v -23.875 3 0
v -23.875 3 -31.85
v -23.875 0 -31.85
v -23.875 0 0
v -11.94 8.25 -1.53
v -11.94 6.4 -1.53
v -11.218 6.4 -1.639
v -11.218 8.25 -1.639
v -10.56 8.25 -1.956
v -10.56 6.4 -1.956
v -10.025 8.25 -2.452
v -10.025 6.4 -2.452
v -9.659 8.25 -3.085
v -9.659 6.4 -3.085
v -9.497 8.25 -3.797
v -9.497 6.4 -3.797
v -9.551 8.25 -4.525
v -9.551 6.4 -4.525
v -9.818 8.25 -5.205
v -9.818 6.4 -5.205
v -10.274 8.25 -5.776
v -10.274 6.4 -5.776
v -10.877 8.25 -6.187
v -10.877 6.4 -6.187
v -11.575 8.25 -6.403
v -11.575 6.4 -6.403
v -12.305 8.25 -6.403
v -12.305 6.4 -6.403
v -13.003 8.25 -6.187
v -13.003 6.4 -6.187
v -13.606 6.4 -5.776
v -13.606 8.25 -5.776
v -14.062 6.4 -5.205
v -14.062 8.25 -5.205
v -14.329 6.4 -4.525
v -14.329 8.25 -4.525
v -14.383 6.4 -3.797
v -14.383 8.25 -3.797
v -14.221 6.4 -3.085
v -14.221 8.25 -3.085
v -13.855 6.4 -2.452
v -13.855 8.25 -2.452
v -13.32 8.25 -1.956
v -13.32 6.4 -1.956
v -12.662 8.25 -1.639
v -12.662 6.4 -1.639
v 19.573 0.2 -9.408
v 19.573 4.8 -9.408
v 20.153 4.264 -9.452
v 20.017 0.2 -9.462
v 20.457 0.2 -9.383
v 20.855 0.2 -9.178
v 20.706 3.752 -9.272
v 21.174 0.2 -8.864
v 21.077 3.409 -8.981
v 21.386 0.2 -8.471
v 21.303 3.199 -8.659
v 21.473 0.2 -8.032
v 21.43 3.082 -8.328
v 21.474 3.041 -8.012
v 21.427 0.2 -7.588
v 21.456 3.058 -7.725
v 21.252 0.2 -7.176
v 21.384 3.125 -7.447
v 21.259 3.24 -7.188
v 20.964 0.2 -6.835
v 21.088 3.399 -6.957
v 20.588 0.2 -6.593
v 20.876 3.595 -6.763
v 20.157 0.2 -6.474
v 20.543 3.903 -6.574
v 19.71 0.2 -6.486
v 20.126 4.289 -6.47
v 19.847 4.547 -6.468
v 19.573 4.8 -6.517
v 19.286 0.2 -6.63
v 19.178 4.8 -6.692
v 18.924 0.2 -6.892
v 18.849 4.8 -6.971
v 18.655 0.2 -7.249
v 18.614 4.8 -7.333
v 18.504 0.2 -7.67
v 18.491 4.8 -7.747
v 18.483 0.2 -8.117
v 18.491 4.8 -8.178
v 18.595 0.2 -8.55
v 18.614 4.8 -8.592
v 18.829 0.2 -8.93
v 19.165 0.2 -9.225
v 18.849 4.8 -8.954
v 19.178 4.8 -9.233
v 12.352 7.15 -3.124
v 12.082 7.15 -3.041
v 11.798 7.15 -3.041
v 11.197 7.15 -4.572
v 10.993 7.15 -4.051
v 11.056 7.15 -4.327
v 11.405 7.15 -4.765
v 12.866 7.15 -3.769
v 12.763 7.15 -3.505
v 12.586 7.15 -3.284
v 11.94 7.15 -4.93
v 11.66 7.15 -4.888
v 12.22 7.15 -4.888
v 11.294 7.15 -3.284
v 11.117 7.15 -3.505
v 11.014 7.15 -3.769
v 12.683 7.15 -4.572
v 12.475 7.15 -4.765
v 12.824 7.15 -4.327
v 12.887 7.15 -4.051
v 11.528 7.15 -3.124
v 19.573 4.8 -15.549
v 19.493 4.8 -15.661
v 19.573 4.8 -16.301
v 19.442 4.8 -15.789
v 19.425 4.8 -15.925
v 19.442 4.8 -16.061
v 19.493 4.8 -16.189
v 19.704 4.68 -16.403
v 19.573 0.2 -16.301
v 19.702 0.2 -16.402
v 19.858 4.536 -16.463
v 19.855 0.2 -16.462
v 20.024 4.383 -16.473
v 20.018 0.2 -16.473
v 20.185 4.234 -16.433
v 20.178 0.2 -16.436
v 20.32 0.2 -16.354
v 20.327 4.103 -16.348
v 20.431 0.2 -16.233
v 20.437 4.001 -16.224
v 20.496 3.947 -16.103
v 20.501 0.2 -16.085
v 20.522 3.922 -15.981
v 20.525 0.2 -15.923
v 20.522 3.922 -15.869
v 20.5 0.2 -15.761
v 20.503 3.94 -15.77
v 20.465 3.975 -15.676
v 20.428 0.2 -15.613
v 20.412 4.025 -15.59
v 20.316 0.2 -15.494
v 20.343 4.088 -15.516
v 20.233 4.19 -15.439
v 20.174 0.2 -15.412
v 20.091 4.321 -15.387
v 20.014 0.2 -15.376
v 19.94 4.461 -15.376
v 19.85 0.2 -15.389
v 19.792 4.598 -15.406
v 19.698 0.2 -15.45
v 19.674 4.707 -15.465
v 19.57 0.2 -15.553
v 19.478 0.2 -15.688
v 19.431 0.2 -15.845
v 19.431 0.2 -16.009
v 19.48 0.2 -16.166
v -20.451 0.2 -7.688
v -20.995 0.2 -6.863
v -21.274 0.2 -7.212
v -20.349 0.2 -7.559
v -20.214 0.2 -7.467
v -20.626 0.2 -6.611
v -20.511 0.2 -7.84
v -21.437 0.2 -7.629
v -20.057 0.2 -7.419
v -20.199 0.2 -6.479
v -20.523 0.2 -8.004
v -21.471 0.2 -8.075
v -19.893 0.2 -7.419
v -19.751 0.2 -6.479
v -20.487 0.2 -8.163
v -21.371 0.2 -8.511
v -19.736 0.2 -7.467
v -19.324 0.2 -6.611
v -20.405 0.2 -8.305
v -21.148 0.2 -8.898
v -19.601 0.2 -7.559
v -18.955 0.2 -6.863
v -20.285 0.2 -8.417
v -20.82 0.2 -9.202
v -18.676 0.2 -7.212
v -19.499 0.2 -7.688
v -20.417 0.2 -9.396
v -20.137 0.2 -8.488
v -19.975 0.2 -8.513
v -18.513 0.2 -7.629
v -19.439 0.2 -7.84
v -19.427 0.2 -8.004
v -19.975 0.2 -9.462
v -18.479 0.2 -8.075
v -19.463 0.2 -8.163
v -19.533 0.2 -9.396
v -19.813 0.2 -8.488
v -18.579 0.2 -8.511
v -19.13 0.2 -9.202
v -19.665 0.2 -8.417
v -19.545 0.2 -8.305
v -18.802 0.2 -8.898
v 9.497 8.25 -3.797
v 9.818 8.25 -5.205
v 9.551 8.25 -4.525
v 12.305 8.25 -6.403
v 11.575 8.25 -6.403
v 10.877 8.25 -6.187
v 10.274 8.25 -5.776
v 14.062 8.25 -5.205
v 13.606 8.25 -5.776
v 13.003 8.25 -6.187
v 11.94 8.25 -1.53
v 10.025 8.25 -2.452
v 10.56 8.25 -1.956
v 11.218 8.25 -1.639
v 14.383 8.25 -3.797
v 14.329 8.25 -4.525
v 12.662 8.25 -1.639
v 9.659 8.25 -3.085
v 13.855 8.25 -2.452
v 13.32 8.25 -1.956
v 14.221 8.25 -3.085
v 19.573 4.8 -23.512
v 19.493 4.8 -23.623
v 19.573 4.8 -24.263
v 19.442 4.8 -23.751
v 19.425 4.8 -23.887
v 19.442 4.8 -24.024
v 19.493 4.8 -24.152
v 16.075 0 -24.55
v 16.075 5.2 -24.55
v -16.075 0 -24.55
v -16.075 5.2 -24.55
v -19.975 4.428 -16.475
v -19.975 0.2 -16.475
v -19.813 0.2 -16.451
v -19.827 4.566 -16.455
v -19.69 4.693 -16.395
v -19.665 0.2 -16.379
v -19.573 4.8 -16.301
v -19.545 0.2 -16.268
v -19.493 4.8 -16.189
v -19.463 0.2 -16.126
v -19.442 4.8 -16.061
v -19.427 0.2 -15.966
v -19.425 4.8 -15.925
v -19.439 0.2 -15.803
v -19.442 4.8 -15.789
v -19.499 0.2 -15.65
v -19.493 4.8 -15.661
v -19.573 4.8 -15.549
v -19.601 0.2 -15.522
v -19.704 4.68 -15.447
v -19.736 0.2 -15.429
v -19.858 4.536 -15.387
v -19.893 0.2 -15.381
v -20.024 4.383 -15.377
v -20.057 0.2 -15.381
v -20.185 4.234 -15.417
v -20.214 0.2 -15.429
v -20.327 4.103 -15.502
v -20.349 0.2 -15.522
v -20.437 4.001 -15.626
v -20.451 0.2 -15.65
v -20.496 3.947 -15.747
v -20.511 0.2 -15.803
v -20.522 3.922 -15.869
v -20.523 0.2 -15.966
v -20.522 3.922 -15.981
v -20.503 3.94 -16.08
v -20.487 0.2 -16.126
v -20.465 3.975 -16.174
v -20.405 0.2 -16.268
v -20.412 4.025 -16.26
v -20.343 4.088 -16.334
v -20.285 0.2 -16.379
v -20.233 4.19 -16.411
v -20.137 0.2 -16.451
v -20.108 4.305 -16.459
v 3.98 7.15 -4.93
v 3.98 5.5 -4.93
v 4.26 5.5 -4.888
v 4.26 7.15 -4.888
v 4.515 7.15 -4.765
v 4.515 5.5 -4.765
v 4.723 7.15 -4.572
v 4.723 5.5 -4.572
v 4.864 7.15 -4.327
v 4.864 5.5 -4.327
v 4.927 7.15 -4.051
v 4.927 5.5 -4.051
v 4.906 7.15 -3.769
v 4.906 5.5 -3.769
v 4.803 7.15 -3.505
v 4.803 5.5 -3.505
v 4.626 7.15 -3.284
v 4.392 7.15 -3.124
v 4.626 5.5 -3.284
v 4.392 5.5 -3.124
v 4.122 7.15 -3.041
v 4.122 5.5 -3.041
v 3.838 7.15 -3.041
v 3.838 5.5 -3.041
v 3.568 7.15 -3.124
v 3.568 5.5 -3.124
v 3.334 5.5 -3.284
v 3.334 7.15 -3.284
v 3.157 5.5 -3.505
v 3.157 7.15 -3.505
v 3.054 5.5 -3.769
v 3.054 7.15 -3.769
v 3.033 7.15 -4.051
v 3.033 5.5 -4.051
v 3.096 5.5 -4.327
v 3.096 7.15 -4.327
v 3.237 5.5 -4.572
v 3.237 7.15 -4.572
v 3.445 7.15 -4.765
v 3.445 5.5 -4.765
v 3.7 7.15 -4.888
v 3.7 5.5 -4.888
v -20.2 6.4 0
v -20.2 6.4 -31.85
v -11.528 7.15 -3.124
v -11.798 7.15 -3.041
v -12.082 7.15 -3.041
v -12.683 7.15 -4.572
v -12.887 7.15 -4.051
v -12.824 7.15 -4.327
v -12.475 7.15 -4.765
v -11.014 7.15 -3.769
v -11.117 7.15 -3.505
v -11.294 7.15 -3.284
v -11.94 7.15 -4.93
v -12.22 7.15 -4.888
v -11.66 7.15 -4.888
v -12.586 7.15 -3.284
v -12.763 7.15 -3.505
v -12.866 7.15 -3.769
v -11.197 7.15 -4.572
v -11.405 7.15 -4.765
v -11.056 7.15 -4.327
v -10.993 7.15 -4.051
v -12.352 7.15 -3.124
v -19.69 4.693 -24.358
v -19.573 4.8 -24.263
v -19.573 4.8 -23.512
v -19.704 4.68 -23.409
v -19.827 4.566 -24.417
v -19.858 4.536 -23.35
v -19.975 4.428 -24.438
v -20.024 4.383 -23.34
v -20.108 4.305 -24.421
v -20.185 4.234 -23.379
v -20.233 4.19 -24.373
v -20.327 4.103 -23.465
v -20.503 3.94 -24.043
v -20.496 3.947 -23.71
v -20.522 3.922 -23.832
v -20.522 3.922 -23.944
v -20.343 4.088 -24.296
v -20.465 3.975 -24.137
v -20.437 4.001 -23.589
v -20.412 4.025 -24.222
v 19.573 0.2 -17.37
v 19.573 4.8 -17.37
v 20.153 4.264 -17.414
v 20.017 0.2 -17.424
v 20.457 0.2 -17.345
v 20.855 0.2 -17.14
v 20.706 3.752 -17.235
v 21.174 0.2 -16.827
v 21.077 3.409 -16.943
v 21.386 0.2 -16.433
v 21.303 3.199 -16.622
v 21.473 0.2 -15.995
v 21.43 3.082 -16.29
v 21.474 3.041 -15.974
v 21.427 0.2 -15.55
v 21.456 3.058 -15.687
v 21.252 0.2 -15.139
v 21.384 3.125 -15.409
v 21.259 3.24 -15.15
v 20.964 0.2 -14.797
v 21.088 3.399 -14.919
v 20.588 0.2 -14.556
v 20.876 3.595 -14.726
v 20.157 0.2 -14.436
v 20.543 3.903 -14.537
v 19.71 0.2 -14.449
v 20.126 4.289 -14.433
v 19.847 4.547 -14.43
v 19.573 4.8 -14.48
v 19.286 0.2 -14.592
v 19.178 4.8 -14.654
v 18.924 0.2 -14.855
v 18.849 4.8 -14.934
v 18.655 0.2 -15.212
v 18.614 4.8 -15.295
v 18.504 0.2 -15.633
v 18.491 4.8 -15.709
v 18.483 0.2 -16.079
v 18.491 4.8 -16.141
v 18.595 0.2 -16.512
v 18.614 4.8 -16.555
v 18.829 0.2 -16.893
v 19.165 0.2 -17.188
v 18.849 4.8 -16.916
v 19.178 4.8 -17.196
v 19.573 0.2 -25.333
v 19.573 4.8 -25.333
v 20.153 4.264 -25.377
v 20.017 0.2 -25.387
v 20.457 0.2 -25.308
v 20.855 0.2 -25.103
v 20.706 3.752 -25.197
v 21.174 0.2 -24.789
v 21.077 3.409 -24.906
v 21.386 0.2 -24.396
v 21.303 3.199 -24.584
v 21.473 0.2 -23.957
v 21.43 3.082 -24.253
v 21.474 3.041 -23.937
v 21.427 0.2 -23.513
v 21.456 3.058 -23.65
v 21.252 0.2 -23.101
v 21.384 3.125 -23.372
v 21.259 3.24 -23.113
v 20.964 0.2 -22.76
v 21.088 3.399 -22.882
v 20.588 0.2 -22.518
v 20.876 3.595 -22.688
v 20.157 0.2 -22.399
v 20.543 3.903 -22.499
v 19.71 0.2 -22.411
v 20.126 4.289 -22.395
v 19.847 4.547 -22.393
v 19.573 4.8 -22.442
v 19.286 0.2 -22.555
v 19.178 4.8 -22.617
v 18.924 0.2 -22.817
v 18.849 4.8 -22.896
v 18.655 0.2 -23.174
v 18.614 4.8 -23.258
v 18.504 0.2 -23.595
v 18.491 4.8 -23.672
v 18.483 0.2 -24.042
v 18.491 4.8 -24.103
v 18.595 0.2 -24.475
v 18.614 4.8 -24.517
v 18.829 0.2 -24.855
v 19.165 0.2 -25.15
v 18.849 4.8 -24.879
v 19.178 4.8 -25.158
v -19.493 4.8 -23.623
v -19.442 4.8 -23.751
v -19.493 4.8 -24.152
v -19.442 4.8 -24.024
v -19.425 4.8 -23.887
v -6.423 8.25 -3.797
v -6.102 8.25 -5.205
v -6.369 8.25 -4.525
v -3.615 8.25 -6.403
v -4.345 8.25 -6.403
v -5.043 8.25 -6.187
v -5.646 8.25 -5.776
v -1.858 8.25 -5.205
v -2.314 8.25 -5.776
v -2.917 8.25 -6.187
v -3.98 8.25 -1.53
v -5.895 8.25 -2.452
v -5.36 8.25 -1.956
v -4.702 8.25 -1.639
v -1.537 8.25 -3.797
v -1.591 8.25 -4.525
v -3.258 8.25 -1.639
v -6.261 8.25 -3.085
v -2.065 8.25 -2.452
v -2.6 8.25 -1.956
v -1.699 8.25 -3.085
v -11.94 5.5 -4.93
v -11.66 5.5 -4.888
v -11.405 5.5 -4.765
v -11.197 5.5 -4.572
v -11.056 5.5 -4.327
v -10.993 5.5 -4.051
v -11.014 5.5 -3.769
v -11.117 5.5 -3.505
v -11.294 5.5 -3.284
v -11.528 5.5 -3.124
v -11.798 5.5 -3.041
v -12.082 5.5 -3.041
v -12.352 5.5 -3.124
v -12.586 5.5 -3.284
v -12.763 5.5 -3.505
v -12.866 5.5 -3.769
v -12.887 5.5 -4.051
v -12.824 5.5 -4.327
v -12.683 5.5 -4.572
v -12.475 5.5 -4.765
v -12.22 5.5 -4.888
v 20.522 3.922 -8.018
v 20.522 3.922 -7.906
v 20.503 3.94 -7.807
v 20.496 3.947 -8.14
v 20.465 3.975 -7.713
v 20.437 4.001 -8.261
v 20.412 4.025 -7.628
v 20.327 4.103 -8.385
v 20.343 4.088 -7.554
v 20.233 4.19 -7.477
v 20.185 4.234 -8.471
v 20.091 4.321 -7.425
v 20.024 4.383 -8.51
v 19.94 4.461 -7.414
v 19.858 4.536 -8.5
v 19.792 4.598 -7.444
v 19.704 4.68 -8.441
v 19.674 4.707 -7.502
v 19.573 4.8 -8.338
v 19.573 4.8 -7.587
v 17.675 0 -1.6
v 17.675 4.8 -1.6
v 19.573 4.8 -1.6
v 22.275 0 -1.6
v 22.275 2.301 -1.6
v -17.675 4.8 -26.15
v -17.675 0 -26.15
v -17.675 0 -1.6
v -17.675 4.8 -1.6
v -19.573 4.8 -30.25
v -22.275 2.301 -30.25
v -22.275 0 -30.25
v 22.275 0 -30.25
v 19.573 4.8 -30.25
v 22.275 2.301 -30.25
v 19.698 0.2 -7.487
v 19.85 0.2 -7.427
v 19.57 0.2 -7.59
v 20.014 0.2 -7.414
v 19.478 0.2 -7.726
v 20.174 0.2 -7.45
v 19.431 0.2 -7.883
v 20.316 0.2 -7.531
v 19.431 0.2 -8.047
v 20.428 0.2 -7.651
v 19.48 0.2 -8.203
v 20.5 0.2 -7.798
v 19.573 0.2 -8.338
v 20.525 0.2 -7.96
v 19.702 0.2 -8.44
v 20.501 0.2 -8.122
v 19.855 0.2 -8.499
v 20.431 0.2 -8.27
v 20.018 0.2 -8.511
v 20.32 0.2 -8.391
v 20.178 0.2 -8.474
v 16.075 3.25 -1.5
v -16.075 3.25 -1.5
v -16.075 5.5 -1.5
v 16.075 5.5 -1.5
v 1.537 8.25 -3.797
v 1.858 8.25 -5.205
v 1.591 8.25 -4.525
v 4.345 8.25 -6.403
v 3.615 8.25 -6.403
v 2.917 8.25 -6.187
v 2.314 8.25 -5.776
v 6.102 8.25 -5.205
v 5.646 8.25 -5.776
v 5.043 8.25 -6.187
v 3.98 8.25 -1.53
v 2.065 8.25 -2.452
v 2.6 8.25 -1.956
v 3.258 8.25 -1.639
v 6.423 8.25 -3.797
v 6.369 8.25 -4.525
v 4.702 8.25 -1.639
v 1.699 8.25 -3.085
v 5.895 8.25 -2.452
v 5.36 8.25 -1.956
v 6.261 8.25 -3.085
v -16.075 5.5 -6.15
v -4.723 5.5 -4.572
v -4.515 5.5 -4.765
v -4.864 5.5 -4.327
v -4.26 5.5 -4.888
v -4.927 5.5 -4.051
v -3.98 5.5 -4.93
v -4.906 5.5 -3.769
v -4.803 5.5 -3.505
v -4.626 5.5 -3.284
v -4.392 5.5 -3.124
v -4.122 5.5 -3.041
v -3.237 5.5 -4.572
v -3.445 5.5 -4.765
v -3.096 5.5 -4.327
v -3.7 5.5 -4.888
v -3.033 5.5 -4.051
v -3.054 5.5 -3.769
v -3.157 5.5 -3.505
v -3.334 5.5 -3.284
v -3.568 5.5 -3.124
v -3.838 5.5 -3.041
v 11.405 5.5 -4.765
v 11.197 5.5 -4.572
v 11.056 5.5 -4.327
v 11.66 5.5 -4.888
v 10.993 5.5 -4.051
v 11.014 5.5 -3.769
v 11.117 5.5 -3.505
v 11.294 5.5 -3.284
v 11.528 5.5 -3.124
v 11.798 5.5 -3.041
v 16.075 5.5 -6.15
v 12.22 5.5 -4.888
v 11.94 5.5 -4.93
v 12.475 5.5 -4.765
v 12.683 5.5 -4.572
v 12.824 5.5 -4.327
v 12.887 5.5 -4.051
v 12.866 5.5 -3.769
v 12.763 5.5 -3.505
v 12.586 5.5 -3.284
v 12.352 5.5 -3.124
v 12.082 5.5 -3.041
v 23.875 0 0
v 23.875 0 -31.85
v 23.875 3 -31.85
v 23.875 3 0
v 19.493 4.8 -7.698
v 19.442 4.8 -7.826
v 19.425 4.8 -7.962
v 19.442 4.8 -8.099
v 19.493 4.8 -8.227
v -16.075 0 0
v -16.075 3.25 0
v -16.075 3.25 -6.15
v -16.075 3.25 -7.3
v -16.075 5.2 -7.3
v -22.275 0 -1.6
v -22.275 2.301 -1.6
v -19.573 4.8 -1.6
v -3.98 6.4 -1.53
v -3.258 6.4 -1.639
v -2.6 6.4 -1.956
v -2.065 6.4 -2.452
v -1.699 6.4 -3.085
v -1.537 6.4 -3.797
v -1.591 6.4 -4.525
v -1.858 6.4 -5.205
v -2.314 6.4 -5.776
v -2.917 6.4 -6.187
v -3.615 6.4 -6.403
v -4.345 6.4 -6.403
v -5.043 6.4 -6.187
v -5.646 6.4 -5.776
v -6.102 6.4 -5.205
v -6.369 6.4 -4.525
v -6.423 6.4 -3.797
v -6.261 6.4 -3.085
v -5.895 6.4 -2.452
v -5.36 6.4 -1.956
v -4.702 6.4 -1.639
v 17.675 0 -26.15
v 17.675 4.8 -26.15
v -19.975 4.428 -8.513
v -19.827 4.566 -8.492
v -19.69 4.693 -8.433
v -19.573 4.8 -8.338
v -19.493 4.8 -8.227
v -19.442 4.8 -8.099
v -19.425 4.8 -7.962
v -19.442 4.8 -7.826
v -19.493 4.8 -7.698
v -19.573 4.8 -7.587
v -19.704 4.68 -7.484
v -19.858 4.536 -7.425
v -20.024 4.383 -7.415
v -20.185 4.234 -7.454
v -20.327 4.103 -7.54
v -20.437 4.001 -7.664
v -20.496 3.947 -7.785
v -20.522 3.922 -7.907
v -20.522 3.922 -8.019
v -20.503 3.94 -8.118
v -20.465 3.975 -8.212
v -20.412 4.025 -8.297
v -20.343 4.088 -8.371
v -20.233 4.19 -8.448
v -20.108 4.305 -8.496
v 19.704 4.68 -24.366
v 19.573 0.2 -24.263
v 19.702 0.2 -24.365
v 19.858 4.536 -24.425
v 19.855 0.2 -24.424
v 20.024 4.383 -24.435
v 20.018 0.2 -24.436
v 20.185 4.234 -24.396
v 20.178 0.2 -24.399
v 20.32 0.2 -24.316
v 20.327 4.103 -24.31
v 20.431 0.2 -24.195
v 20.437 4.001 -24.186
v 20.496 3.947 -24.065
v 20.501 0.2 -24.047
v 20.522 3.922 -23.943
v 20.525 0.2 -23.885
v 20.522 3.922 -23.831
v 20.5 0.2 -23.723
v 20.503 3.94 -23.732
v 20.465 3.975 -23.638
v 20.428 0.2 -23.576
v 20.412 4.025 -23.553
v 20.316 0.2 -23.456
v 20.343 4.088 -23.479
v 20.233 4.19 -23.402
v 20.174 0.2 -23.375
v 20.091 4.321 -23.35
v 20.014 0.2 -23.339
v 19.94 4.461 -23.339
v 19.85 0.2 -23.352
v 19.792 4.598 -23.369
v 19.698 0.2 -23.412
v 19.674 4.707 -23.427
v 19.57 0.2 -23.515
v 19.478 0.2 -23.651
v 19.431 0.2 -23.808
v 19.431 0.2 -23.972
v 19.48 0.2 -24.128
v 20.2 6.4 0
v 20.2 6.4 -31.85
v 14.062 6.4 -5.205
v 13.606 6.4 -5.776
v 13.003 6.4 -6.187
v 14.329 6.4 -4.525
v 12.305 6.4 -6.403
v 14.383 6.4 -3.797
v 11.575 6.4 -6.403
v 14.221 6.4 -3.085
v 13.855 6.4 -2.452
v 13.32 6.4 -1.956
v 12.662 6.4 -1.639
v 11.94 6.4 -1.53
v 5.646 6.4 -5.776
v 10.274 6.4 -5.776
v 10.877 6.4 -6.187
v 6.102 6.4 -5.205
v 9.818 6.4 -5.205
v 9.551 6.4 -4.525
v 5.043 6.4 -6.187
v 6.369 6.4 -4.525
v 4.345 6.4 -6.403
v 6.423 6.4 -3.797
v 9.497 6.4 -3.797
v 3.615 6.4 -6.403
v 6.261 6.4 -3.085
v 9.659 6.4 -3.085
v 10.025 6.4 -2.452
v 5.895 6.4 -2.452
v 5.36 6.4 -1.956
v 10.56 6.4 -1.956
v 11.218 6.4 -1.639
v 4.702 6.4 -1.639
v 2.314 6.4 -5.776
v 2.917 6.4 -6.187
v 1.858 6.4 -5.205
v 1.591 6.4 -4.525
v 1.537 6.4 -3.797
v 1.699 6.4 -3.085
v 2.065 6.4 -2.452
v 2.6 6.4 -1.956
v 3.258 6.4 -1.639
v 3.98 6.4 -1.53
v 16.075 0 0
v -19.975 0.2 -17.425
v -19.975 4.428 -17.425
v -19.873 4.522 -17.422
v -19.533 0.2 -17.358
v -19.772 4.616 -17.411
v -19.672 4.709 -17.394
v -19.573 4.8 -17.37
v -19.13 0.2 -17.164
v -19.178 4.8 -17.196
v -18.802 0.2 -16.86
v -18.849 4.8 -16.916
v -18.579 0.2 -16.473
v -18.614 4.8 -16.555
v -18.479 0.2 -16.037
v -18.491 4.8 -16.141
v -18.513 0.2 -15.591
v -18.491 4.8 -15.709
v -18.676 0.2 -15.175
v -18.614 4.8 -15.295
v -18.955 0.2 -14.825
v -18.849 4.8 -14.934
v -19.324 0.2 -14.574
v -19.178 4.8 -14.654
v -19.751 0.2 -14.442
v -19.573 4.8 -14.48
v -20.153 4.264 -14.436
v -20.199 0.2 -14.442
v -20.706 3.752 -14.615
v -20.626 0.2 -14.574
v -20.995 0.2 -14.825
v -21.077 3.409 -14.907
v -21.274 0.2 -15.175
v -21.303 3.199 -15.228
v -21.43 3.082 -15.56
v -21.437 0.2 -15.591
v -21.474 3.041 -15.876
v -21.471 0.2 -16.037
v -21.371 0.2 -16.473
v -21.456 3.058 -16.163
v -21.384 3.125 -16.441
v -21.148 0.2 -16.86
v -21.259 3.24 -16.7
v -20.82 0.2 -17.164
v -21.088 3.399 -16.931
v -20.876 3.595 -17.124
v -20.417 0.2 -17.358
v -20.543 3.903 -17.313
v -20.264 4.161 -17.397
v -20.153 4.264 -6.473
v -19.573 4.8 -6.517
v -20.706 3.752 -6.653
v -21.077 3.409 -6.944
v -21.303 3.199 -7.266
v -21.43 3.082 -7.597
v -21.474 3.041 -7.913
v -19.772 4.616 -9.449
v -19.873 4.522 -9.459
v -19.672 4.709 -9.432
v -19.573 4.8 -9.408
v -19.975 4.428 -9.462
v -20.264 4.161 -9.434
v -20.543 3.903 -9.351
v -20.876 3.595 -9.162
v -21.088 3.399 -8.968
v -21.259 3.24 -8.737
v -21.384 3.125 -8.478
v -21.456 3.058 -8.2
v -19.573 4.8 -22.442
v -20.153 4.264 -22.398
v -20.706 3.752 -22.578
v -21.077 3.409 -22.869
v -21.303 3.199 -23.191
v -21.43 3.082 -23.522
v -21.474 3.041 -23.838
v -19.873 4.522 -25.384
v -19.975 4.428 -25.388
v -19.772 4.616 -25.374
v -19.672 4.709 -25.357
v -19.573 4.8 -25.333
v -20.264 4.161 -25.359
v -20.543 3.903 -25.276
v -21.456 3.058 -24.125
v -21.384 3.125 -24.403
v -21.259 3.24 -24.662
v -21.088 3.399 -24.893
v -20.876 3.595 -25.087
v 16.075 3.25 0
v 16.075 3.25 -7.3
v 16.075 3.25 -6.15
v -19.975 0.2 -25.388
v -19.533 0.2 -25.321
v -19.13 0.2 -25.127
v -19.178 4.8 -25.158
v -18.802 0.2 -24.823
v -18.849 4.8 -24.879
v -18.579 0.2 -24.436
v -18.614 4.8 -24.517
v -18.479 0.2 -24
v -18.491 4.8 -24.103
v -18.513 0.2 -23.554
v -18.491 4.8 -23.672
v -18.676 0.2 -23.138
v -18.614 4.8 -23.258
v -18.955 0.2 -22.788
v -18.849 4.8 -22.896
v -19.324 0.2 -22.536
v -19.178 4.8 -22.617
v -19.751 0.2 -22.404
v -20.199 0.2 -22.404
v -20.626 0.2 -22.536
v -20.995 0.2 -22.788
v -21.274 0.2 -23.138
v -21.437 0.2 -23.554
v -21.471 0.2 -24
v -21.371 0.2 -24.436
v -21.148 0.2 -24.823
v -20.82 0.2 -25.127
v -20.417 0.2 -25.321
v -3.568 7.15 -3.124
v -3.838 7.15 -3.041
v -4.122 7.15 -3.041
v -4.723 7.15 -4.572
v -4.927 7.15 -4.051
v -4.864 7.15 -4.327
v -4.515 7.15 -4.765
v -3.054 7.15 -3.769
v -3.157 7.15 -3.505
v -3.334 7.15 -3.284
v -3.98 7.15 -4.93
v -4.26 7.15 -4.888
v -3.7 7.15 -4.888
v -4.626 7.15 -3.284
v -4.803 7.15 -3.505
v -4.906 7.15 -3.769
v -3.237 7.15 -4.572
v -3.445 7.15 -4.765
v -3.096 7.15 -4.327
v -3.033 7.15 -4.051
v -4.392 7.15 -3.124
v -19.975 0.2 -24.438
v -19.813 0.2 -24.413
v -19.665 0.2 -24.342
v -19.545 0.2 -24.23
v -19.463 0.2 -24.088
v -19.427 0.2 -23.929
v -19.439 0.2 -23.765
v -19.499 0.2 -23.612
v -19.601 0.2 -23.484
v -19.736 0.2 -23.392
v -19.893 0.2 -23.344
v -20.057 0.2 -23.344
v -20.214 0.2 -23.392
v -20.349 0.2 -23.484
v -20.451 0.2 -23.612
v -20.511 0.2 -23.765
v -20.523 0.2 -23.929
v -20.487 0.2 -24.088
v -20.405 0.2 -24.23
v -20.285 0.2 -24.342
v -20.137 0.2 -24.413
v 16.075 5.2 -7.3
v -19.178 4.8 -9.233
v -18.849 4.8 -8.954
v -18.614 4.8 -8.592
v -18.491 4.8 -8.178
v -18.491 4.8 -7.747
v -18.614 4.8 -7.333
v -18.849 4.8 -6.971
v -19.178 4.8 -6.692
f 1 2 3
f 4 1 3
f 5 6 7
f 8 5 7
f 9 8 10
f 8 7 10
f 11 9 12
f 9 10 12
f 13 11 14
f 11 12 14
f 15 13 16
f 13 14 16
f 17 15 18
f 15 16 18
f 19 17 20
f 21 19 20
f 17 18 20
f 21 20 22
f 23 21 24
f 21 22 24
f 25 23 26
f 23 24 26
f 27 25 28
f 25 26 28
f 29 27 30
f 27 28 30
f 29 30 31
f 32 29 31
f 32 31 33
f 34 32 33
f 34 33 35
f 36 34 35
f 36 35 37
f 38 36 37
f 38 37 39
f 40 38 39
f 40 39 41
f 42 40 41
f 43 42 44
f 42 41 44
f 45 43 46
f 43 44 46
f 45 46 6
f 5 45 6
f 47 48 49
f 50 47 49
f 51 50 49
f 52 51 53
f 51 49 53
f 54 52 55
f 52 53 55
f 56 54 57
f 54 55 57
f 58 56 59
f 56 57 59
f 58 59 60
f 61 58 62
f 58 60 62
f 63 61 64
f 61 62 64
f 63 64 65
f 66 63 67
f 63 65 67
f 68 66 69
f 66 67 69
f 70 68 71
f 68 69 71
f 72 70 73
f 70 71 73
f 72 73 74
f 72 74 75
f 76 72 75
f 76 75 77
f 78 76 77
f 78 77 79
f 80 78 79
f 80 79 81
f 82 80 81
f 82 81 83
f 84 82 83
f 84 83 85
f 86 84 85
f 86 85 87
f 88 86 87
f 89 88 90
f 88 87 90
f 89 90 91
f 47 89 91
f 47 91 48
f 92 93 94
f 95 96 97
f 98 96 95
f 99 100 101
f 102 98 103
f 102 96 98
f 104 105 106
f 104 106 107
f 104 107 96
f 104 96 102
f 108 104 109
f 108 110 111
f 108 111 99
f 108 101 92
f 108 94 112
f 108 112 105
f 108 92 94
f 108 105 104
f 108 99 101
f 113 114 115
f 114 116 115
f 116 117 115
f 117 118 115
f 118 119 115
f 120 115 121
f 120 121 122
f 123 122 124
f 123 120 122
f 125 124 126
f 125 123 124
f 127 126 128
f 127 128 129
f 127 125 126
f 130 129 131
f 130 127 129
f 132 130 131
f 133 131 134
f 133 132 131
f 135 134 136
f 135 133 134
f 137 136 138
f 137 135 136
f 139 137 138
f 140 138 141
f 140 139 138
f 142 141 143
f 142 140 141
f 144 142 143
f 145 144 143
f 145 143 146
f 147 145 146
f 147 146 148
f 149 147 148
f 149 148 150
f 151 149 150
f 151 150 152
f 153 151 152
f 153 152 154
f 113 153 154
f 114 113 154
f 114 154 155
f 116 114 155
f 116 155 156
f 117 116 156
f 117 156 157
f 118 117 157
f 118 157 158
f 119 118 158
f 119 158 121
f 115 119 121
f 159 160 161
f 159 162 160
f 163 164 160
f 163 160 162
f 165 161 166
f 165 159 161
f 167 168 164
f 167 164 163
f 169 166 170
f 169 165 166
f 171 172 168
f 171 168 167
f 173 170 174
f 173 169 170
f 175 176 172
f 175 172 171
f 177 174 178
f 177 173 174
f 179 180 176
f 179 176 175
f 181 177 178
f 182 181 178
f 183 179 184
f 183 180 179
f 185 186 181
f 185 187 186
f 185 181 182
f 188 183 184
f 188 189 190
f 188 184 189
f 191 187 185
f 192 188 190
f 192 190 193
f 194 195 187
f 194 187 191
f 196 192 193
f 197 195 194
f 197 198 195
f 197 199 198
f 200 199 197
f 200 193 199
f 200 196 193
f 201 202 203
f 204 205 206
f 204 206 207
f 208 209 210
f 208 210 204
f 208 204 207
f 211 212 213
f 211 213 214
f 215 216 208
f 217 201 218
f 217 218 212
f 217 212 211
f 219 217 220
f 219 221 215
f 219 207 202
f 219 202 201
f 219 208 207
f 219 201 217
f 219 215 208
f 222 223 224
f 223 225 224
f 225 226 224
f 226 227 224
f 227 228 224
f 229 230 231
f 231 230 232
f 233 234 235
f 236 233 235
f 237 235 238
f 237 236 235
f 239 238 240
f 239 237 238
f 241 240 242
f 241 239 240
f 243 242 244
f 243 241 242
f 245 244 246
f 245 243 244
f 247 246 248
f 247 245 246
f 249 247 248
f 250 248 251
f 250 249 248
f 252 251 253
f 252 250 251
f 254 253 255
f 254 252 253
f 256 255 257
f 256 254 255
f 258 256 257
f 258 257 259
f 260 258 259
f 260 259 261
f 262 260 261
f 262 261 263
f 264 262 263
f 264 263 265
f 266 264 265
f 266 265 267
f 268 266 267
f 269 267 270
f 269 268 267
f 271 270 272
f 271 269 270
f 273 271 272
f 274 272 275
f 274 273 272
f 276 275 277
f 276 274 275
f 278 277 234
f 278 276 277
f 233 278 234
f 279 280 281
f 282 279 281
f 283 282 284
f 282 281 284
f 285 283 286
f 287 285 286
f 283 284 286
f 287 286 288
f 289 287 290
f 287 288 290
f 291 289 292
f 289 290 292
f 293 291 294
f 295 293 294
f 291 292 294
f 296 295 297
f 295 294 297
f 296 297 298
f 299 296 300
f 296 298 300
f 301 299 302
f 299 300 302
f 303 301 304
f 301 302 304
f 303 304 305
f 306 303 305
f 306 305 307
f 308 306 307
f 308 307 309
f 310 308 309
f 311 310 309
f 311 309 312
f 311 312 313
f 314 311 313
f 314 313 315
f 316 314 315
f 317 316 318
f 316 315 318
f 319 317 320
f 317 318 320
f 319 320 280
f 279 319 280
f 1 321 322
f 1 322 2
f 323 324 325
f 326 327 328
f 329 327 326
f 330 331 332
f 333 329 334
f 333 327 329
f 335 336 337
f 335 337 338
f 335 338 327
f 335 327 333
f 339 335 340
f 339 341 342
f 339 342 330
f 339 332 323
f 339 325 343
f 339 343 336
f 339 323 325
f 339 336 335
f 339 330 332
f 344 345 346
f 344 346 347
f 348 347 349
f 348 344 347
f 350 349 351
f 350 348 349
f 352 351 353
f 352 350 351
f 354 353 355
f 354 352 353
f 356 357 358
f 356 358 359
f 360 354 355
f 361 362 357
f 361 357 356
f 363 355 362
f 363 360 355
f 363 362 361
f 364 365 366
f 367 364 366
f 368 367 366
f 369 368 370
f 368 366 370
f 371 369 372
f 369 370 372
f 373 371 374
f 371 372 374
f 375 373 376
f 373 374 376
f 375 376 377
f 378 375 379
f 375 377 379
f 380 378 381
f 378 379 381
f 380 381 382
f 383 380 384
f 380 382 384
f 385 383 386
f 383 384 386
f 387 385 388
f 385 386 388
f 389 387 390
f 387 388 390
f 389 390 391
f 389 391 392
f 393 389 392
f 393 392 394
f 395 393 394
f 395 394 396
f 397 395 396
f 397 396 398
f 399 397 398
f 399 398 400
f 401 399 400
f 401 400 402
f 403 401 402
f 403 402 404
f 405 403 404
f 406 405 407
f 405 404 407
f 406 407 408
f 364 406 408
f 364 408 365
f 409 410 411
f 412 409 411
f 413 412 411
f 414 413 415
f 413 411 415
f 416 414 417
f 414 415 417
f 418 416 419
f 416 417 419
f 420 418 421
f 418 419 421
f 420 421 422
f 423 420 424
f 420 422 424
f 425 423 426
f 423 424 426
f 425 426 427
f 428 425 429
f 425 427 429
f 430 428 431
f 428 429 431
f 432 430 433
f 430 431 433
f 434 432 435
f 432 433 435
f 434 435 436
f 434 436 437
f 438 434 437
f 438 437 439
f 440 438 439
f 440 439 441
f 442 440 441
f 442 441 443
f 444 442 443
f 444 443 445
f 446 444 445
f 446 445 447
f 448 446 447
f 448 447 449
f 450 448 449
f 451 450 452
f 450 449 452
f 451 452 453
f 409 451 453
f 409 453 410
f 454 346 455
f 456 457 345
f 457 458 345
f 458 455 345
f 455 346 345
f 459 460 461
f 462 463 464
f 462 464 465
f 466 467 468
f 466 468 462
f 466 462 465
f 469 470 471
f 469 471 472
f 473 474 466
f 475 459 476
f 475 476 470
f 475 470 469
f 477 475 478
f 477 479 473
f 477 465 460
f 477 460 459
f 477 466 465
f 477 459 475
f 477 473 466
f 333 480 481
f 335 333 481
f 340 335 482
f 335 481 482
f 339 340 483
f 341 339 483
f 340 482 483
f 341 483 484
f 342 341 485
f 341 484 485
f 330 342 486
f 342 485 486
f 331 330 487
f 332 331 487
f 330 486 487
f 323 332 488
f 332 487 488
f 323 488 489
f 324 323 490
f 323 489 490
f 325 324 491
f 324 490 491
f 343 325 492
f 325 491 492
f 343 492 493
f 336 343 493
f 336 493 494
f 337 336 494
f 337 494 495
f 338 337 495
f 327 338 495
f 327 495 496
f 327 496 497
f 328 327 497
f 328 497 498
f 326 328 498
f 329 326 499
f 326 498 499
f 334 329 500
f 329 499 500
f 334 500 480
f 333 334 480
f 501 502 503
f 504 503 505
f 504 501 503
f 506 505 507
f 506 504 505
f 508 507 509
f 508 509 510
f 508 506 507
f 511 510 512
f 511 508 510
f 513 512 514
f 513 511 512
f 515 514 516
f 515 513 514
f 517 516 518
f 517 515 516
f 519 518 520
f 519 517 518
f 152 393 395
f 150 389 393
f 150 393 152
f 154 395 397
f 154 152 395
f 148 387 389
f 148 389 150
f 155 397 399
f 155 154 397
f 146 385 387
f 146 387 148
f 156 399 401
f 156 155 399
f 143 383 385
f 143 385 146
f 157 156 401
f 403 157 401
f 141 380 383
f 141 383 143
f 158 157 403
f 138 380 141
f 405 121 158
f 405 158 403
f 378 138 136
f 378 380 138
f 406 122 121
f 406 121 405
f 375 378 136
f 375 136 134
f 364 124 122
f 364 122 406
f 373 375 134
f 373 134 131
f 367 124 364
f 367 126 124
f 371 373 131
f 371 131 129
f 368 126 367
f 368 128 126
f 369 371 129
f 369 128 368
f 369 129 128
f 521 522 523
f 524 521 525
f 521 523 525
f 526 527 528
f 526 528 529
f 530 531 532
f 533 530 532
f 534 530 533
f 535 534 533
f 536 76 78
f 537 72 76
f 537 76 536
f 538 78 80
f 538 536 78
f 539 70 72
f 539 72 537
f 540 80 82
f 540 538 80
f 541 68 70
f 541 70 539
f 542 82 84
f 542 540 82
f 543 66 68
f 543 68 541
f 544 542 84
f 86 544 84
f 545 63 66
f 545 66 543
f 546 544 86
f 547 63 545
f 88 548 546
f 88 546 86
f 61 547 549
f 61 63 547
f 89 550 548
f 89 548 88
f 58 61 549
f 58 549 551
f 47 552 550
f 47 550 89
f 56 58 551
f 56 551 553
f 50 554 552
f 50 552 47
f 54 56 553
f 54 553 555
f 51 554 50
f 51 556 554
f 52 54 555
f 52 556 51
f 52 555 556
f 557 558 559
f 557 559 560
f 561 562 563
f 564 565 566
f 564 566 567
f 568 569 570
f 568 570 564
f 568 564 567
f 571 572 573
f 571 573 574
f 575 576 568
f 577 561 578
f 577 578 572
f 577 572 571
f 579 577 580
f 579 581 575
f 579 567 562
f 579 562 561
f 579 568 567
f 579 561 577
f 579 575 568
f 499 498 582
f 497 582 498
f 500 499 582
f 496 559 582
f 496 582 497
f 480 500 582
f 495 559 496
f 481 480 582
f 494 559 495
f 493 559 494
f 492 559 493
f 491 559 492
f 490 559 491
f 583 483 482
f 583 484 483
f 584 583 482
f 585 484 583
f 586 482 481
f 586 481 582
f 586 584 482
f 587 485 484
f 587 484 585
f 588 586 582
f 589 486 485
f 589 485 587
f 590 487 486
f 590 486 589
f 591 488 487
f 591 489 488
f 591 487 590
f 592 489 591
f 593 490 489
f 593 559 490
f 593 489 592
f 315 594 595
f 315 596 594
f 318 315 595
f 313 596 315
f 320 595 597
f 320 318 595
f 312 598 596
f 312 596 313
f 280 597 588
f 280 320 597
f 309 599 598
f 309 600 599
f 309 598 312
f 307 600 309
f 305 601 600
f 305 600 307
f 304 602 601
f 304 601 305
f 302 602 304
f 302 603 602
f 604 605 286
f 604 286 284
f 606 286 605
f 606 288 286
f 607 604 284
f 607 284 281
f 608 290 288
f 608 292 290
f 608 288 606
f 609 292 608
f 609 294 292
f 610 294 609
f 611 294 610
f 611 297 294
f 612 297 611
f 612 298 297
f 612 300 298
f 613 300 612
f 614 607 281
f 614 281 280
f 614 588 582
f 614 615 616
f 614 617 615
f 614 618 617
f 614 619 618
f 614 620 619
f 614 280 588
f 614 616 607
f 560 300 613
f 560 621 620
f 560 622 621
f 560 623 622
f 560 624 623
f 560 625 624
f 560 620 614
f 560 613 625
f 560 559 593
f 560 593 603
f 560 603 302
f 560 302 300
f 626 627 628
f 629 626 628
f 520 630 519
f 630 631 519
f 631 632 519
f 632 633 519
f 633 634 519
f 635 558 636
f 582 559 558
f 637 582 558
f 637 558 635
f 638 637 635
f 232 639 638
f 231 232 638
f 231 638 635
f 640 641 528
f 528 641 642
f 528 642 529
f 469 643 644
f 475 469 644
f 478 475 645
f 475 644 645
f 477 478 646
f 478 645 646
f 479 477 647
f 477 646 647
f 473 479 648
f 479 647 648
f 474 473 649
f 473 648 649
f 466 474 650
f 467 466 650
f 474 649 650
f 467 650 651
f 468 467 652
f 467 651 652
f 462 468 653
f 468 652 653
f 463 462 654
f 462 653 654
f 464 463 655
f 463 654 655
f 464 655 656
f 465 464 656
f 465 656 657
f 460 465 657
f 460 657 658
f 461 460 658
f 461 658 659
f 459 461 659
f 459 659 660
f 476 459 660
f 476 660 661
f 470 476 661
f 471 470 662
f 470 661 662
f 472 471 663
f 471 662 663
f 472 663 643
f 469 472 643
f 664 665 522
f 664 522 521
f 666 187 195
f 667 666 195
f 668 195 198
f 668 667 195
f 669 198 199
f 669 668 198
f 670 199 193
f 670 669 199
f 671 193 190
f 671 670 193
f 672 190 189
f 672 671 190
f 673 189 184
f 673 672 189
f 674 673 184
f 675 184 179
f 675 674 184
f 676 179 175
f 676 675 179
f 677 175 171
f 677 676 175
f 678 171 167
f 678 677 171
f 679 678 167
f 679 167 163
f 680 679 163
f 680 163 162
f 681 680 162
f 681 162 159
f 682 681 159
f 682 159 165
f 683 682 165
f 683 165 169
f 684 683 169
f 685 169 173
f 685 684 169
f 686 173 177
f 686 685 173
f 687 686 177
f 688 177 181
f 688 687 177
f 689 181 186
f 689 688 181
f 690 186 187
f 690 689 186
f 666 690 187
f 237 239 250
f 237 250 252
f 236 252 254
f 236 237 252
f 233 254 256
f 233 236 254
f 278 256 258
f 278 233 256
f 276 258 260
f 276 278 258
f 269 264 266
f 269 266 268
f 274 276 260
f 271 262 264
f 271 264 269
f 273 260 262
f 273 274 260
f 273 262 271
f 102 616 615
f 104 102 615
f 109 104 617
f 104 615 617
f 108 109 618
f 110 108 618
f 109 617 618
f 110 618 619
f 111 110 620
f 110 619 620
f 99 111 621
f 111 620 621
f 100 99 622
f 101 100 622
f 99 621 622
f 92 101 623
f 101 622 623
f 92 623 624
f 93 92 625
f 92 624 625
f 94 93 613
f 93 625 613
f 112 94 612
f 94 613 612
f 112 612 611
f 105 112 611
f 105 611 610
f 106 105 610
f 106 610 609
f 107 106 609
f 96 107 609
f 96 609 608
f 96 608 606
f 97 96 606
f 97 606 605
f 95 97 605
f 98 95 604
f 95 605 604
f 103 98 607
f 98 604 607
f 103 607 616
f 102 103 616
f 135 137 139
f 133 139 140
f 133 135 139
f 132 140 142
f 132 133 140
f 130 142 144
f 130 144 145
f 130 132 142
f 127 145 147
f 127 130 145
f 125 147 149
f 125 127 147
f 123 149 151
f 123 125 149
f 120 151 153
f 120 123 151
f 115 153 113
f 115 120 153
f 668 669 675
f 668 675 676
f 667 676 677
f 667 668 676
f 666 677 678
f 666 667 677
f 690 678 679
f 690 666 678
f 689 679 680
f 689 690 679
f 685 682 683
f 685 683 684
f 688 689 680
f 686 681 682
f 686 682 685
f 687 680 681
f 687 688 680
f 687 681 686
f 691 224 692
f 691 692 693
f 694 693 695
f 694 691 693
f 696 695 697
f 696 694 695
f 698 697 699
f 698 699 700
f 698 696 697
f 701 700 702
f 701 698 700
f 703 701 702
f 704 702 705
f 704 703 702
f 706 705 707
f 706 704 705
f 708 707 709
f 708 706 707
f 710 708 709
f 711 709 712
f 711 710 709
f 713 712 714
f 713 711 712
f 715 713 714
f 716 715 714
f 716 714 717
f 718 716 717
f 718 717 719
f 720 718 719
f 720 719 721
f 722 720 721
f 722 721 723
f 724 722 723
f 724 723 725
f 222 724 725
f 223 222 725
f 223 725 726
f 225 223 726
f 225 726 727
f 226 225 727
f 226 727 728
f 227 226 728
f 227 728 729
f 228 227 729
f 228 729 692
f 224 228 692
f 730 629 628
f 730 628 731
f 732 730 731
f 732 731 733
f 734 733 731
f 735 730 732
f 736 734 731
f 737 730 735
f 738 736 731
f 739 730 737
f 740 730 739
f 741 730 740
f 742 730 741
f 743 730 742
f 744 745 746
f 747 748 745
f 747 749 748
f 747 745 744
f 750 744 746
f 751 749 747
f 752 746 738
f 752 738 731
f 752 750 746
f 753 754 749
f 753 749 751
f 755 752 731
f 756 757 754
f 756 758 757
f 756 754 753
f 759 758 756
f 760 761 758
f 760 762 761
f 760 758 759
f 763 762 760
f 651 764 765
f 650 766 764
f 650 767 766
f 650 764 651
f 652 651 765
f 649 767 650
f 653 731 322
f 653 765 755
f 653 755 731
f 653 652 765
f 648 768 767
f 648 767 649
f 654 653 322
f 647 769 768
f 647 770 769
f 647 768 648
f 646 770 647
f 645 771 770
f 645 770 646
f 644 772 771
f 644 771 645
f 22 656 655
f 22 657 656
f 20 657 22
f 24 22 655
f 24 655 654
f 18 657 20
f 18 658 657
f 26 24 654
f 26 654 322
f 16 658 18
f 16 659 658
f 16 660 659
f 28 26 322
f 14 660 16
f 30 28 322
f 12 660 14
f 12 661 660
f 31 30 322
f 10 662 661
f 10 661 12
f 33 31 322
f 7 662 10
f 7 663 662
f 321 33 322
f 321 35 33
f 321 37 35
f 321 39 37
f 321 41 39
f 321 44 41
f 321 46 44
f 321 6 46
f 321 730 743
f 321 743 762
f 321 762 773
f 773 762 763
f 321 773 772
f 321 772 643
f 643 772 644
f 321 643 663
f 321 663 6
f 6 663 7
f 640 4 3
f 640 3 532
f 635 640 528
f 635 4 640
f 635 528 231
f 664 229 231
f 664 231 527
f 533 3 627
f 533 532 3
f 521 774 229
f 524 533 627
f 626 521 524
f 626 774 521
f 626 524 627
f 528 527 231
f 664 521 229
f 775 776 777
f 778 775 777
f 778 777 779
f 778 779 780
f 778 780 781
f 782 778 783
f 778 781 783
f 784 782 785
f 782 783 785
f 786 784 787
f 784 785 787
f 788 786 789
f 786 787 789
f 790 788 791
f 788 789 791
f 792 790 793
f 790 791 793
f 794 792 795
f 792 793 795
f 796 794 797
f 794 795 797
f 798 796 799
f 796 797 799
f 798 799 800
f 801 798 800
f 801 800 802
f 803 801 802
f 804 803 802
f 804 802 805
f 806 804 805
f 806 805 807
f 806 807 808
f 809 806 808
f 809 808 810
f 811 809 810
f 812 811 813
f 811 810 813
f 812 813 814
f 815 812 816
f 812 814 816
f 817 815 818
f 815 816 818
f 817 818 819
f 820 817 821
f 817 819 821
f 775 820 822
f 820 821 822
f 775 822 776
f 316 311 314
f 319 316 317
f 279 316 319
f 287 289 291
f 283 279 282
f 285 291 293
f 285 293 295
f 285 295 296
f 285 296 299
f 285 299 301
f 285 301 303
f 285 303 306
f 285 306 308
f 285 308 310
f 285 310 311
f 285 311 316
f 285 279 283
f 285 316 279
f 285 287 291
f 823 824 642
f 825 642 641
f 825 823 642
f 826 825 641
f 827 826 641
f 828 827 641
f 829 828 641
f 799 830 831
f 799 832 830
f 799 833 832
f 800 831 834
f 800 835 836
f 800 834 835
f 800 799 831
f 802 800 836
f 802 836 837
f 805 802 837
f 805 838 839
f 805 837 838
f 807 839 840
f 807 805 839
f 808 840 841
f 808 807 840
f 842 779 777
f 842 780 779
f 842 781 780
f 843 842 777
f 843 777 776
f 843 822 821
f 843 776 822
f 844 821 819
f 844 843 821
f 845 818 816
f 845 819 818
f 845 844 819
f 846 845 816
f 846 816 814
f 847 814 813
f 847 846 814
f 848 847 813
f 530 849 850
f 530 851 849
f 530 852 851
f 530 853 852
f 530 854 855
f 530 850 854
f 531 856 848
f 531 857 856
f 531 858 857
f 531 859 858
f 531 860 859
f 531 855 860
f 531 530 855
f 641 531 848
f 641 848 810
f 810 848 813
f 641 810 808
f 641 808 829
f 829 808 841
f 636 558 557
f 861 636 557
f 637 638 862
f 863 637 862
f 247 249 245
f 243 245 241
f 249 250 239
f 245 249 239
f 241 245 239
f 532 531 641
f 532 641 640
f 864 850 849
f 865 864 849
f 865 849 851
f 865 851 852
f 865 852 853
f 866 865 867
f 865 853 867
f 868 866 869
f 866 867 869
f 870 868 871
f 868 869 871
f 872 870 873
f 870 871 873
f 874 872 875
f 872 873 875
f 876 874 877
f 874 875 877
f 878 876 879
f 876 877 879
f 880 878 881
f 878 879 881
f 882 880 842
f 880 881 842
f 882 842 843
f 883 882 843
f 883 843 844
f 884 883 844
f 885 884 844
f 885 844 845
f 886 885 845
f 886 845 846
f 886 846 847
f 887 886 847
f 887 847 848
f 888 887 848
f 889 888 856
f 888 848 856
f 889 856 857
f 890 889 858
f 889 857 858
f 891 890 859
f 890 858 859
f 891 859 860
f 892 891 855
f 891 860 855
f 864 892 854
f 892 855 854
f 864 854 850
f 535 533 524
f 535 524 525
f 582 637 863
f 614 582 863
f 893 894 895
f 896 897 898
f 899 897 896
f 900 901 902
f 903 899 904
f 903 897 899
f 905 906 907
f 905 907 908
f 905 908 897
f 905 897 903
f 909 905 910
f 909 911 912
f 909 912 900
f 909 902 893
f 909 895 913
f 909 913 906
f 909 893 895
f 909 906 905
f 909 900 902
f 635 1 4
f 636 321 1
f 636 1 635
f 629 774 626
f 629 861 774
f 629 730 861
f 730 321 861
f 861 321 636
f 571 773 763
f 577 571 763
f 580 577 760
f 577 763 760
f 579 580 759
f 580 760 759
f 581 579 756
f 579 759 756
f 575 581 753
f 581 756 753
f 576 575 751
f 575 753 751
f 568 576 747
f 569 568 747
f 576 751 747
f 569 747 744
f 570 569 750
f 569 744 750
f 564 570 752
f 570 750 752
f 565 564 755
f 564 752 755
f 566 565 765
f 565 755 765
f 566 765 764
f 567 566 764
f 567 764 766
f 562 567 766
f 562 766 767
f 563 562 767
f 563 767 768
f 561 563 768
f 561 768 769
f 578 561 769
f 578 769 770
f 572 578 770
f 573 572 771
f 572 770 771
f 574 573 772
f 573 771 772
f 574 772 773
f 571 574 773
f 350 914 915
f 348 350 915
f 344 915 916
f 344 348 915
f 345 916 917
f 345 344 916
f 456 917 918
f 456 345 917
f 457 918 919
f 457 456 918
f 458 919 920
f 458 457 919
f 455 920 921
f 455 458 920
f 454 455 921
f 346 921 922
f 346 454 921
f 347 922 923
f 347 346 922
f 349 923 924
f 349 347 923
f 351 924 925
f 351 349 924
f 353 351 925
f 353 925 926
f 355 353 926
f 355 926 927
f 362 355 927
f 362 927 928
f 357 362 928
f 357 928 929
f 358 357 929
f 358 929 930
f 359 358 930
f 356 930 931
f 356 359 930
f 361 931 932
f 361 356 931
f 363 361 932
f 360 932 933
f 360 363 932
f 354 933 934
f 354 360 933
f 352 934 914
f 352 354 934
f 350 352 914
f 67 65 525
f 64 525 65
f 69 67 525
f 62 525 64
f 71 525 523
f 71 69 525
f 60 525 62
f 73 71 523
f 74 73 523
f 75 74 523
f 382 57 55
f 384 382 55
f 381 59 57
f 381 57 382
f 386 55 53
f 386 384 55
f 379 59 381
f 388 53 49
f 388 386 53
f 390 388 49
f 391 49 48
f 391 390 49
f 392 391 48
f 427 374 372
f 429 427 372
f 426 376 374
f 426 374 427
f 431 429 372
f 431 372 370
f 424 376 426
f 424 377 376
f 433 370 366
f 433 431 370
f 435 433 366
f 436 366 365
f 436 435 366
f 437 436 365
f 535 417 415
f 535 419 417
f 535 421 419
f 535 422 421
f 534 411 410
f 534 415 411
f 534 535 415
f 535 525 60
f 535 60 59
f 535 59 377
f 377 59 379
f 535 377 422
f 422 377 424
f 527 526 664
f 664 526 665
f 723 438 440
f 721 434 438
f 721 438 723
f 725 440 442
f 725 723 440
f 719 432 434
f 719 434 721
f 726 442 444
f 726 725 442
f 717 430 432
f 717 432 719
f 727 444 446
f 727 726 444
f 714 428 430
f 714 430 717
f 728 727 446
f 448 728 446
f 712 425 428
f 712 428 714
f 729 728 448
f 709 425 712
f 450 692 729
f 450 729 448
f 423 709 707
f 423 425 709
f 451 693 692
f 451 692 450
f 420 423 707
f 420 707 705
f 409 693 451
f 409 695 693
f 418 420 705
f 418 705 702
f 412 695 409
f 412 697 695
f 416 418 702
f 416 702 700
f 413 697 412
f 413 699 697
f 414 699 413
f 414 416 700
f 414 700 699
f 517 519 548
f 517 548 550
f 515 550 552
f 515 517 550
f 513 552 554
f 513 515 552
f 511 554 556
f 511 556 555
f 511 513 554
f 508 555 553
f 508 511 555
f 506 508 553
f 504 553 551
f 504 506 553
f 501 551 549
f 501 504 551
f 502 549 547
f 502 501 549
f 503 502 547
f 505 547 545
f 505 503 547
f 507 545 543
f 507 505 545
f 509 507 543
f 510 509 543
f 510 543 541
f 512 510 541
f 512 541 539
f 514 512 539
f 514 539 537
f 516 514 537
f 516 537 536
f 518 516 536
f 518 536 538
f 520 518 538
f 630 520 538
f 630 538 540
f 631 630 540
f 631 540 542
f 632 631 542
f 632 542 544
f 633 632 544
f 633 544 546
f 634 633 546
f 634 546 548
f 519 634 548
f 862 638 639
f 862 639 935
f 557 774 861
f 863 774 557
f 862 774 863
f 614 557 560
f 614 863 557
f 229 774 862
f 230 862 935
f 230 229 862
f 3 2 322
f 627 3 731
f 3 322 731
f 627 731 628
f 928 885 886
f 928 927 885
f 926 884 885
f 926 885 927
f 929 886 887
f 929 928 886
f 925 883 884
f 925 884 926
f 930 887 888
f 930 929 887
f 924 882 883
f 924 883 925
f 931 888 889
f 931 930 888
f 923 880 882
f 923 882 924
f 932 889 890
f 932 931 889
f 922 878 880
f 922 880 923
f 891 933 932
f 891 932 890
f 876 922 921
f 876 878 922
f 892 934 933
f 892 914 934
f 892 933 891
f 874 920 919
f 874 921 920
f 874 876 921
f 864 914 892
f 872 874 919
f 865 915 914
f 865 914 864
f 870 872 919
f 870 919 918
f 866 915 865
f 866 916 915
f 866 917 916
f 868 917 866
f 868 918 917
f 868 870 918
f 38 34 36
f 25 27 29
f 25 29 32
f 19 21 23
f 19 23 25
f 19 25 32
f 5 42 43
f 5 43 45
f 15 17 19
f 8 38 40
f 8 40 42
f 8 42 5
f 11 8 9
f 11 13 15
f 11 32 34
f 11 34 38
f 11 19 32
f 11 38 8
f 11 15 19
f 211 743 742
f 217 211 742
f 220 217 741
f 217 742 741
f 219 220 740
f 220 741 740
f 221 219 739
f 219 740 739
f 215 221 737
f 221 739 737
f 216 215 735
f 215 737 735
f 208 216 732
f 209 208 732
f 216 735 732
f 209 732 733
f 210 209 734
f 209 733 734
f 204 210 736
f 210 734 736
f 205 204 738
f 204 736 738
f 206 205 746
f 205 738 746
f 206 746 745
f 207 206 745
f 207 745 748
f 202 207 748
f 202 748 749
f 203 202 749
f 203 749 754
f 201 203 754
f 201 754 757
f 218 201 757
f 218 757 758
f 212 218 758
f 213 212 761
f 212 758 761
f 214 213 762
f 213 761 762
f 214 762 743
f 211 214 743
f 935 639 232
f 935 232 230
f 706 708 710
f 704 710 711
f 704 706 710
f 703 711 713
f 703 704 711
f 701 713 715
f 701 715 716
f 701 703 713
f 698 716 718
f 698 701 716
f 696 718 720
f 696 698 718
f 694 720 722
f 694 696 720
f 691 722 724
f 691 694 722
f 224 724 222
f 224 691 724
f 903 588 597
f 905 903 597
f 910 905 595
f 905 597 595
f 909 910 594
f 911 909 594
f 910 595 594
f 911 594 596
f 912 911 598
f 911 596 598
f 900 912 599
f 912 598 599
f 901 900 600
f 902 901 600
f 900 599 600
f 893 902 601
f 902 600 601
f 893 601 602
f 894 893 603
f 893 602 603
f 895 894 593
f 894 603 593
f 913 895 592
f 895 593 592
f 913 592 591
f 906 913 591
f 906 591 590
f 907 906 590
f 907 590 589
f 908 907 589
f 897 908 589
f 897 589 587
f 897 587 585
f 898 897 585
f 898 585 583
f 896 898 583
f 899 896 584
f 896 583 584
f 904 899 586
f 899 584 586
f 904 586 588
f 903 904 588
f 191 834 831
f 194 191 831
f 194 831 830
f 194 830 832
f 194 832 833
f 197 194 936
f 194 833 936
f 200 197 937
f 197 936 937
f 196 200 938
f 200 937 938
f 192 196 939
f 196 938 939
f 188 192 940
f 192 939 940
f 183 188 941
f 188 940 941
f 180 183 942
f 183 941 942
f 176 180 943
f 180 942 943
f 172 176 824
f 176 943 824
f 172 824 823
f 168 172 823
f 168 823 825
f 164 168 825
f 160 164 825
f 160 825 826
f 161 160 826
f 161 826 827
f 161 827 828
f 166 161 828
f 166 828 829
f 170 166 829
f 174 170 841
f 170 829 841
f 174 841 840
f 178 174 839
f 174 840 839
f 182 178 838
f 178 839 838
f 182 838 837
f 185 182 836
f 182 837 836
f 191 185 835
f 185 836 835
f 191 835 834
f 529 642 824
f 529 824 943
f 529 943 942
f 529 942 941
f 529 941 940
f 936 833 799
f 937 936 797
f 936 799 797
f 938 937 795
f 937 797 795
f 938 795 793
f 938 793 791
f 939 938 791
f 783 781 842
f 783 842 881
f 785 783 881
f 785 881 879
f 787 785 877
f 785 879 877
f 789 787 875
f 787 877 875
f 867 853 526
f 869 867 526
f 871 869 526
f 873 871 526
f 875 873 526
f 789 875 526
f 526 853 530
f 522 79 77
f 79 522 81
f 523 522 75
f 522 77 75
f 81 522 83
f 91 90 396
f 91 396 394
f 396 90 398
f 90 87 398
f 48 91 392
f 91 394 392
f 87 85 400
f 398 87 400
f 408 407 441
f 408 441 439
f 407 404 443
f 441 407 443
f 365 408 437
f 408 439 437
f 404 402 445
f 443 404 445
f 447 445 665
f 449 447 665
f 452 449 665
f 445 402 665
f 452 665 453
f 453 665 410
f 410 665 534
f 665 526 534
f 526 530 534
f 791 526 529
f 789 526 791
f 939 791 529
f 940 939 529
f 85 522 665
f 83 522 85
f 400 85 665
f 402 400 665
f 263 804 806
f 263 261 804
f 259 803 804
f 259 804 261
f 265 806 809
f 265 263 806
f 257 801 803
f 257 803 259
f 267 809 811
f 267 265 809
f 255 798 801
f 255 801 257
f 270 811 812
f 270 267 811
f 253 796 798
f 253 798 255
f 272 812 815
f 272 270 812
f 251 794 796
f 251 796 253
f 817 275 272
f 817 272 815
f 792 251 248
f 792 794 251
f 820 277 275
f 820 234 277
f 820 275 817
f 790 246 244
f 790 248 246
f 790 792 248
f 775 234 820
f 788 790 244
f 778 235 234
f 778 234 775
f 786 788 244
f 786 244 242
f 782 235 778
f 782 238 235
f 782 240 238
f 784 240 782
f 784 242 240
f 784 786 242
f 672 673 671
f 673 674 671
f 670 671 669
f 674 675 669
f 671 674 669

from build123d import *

# Parameters (mm, degrees)
BOSS_EXTRUDE1_DEPTH     = 31.85
CUT_EXTRUDE1_DEPTH      = 41.316226572
CUT_EXTRUDE1_DEPTH_BACK = 24.55
SHELL1_START            = -30.25
SHELL1_DEPTH            = 28.65
SHELL1_2_OUTLINE_W      = 35.35
SHELL1_2_OUTLINE_H      = 4.8
SHELL1_2_DEPTH          = 4.1
BOSS_EXTRUDE2_START     = -4.6
SKETCH3_R               = 1.5
SKETCH3_R_2             = 0.55
BOSS_EXTRUDE2_DEPTH     = 4.6
SKETCH4_W               = 32.15
SKETCH4_H               = 17.25
CUT_EXTRUDE2_DEPTH      = 1.95
SKETCH5_W               = 32.15
SKETCH5_H               = 4.65
CUT_EXTRUDE3_DEPTH      = 2.25
SKETCH6_R               = 2.45
BOSS_EXTRUDE3_DEPTH     = 1.85
SKETCH7_R               = 0.95
CUT_EXTRUDE4_DEPTH      = 1.65


# Read off the part's stored shape, not the designer's step: Shell1
with BuildPart() as part:
    # Sketch1 → Boss-Extrude1 (new body)
    with BuildSketch(Plane.XY):
        Polygon((23.875, 0), (23.875, 3), (20.2, 6.4), (-20.2, 6.4), (-23.875, 3), (-23.875, 0), align=None)
    extrude(amount=-BOSS_EXTRUDE1_DEPTH)

    # Sketch2 → Cut-Extrude1 (cut, two sides: drawn at the far end of the back side and taken through both)
    with BuildSketch(Plane.XY.offset(-CUT_EXTRUDE1_DEPTH_BACK)):
        Polygon((-16.075, -90.918786447), (-16.075, 0), (-16.075, 3.25), (16.075, 3.25), (16.075, 0), (16.075, -90.918786447), (16.075, -272.75635934), (-16.075, -272.75635934), align=None)
    extrude(amount=CUT_EXTRUDE1_DEPTH + CUT_EXTRUDE1_DEPTH_BACK, mode=Mode.SUBTRACT)

    # Shell1 outline → Shell1 (cut)
    with BuildSketch(Plane.XY.offset(SHELL1_START)):
        Polygon((22.275, 2.30054609), (19.573384377, 4.8), (17.675, 4.8), (17.675, 0), (22.275, 0), align=None)
        Polygon((-17.675, 0), (-17.675, 4.8), (-19.573384377, 4.8), (-22.275, 2.30054609), (-22.275, 0), align=None)
    extrude(amount=SHELL1_DEPTH, mode=Mode.SUBTRACT)

    # Shell1 2 outline → Shell1 2 (cut)
    with BuildSketch(Plane.XY.offset(SHELL1_START)):
        with Locations((0, 2.4)):
            Rectangle(SHELL1_2_OUTLINE_W, SHELL1_2_OUTLINE_H)
    extrude(amount=SHELL1_2_DEPTH, mode=Mode.SUBTRACT)

    # Sketch3 → Boss-Extrude2 (add)
    # profile 1 of 6: a face of its own
    with BuildSketch(Plane(origin=(0, 0.2, 0), x_dir=(-1, 0, 0), z_dir=(0, -1, 0)).offset(BOSS_EXTRUDE2_START)):
        with Locations(Location((19.975, 7.9625, 0), (0, 0, 90))):
            Circle(SKETCH3_R)
        with Locations(Location((19.975, 7.9625, 0), (0, 0, 90))):
            Circle(SKETCH3_R_2, mode=Mode.SUBTRACT)
    # profile 2 of 6: a face of its own
    with BuildSketch(Plane(origin=(0, 0.2, 0), x_dir=(-1, 0, 0), z_dir=(0, -1, 0)).offset(BOSS_EXTRUDE2_START)):
        with Locations(Location((19.975, 15.925, 0), (0, 0, 90))):
            Circle(SKETCH3_R)
        with Locations(Location((19.975, 15.925, 0), (0, 0, 90))):
            Circle(SKETCH3_R_2, mode=Mode.SUBTRACT)
    # profile 3 of 6: a face of its own
    with BuildSketch(Plane(origin=(0, 0.2, 0), x_dir=(-1, 0, 0), z_dir=(0, -1, 0)).offset(BOSS_EXTRUDE2_START)):
        with Locations(Location((19.975, 23.8875, 0), (0, 0, 90))):
            Circle(SKETCH3_R)
        with Locations(Location((19.975, 23.8875, 0), (0, 0, 90))):
            Circle(SKETCH3_R_2, mode=Mode.SUBTRACT)
    # profile 4 of 6: a face of its own
    with BuildSketch(Plane(origin=(0, 0.2, 0), x_dir=(-1, 0, 0), z_dir=(0, -1, 0)).offset(BOSS_EXTRUDE2_START)):
        with Locations(Location((-19.975, 23.8875, 0), (0, 0, 74.469949242))):
            Circle(SKETCH3_R)
        with Locations(Location((-19.975, 23.8875, 0), (0, 0, 43.095979253))):
            Circle(SKETCH3_R_2, mode=Mode.SUBTRACT)
    # profile 5 of 6: a face of its own
    with BuildSketch(Plane(origin=(0, 0.2, 0), x_dir=(-1, 0, 0), z_dir=(0, -1, 0)).offset(BOSS_EXTRUDE2_START)):
        with Locations(Location((-19.975, 15.925, 0), (0, 0, 74.469949242))):
            Circle(SKETCH3_R)
        with Locations(Location((-19.975, 15.925, 0), (0, 0, 43.095979253))):
            Circle(SKETCH3_R_2, mode=Mode.SUBTRACT)
    # profile 6 of 6: a face of its own
    with BuildSketch(Plane(origin=(0, 0.2, 0), x_dir=(-1, 0, 0), z_dir=(0, -1, 0)).offset(BOSS_EXTRUDE2_START)):
        with Locations(Location((-19.975, 7.9625, 0), (0, 0, 74.469949242))):
            Circle(SKETCH3_R)
        with Locations(Location((-19.975, 7.9625, 0), (0, 0, 43.095979253))):
            Circle(SKETCH3_R_2, mode=Mode.SUBTRACT)
    extrude(amount=BOSS_EXTRUDE2_DEPTH)

    # Sketch4 → Cut-Extrude2 (cut)
    with BuildSketch(Plane.XZ.offset(-3.25)):
        with Locations((0, -15.925)):
            Rectangle(SKETCH4_W, SKETCH4_H)
    extrude(amount=-CUT_EXTRUDE2_DEPTH, mode=Mode.SUBTRACT)

    # Sketch5 → Cut-Extrude3 (cut)
    with BuildSketch(Plane.XZ.offset(-3.25)):
        with Locations((0, -3.825)):
            Rectangle(SKETCH5_W, SKETCH5_H)
    extrude(amount=-CUT_EXTRUDE3_DEPTH, mode=Mode.SUBTRACT)

    # Sketch6 → Boss-Extrude3 (add)
    with BuildSketch(Plane(origin=(0, 6.4, 0), x_dir=(1, 0, 0), z_dir=(0, 1, 0))):
        with Locations(Location((-3.98, 3.98, 0), (0, 0, 270))):
            Circle(SKETCH6_R)
        with Locations(Location((3.98, 3.98, 0), (0, 0, 270))):
            Circle(SKETCH6_R)
        with Locations(Location((-11.94, 3.98, 0), (0, 0, 270))):
            Circle(SKETCH6_R)
        with Locations(Location((11.94, 3.98, 0), (0, 0, 270))):
            Circle(SKETCH6_R)
    extrude(amount=BOSS_EXTRUDE3_DEPTH)

    # Sketch7 → Cut-Extrude4 (cut)
    with BuildSketch(Plane.XZ.offset(-5.5)):
        with Locations(Location((-11.94, -3.98, 0), (0, 0, 270))):
            Circle(SKETCH7_R)
        with Locations(Location((-3.98, -3.98, 0), (0, 0, 270))):
            Circle(SKETCH7_R)
        with Locations(Location((3.98, -3.98, 0), (0, 0, 270))):
            Circle(SKETCH7_R)
        with Locations(Location((11.94, -3.98, 0), (0, 0, 270))):
            Circle(SKETCH7_R)
    extrude(amount=-CUT_EXTRUDE4_DEPTH, mode=Mode.SUBTRACT)


solid = part.part
